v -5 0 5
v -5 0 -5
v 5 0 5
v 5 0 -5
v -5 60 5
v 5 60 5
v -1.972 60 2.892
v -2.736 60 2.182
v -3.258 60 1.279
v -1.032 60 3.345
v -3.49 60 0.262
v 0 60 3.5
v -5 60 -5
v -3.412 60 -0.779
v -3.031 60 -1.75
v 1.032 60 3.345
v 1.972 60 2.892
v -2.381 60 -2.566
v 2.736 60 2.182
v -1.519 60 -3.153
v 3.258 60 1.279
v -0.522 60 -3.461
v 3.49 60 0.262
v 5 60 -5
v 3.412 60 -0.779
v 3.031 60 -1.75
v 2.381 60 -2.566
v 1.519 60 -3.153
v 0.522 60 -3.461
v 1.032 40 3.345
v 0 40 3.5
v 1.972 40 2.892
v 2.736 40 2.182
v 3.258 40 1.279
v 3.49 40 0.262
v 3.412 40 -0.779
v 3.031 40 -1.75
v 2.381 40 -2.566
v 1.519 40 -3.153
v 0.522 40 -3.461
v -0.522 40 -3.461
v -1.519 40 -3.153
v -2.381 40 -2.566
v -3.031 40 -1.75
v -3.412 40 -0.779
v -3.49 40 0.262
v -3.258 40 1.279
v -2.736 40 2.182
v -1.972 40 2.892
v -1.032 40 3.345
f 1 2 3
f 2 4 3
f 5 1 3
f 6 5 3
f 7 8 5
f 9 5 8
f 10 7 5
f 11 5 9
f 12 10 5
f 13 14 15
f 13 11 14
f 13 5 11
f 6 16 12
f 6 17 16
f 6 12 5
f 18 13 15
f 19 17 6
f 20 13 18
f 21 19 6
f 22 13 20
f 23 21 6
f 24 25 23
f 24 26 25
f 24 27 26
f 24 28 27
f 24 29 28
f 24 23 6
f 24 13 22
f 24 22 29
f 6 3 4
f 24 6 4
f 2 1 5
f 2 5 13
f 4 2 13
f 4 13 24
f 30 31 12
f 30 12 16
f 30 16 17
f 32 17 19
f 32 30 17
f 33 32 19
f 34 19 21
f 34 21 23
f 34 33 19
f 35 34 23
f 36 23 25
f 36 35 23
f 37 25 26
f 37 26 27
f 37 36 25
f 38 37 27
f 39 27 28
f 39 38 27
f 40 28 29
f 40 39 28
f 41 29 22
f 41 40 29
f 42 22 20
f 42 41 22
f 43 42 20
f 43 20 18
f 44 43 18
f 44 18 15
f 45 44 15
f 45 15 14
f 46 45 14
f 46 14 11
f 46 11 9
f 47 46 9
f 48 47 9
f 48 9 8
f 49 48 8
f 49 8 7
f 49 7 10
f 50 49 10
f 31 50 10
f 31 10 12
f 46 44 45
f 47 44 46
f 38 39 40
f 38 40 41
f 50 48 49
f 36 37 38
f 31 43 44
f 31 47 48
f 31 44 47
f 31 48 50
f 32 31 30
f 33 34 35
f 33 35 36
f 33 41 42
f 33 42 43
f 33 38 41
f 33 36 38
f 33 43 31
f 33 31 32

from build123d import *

# Parameters (mm, degrees)
SKETCH1_W           = 10
SKETCH1_H           = 10
SKETCH1_R           = 3.5
BOSS_EXTRUDE1_DEPTH = 60
SKETCH2_R           = 3.5
BOSS_EXTRUDE2_DEPTH = 40


with BuildPart() as part:
    # Sketch1 → Boss-Extrude1 (new body)
    with BuildSketch(Plane(origin=(0, 0, 0), x_dir=(1, 0, 0), z_dir=(0, 1, 0))):
        Rectangle(SKETCH1_W, SKETCH1_H)
        with Locations(Location((0, 0, 0), (0, 0, 270))):
            Circle(SKETCH1_R, mode=Mode.SUBTRACT)
    extrude(amount=BOSS_EXTRUDE1_DEPTH)

    # Sketch2 → Boss-Extrude2 (add)
    with BuildSketch(Plane(origin=(0, 0, 0), x_dir=(1, 0, 0), z_dir=(0, 1, 0))):
        with Locations(Location((0, 0, 0), (0, 0, 270))):
            Circle(SKETCH2_R)
    extrude(amount=BOSS_EXTRUDE2_DEPTH)


solid = part.part
